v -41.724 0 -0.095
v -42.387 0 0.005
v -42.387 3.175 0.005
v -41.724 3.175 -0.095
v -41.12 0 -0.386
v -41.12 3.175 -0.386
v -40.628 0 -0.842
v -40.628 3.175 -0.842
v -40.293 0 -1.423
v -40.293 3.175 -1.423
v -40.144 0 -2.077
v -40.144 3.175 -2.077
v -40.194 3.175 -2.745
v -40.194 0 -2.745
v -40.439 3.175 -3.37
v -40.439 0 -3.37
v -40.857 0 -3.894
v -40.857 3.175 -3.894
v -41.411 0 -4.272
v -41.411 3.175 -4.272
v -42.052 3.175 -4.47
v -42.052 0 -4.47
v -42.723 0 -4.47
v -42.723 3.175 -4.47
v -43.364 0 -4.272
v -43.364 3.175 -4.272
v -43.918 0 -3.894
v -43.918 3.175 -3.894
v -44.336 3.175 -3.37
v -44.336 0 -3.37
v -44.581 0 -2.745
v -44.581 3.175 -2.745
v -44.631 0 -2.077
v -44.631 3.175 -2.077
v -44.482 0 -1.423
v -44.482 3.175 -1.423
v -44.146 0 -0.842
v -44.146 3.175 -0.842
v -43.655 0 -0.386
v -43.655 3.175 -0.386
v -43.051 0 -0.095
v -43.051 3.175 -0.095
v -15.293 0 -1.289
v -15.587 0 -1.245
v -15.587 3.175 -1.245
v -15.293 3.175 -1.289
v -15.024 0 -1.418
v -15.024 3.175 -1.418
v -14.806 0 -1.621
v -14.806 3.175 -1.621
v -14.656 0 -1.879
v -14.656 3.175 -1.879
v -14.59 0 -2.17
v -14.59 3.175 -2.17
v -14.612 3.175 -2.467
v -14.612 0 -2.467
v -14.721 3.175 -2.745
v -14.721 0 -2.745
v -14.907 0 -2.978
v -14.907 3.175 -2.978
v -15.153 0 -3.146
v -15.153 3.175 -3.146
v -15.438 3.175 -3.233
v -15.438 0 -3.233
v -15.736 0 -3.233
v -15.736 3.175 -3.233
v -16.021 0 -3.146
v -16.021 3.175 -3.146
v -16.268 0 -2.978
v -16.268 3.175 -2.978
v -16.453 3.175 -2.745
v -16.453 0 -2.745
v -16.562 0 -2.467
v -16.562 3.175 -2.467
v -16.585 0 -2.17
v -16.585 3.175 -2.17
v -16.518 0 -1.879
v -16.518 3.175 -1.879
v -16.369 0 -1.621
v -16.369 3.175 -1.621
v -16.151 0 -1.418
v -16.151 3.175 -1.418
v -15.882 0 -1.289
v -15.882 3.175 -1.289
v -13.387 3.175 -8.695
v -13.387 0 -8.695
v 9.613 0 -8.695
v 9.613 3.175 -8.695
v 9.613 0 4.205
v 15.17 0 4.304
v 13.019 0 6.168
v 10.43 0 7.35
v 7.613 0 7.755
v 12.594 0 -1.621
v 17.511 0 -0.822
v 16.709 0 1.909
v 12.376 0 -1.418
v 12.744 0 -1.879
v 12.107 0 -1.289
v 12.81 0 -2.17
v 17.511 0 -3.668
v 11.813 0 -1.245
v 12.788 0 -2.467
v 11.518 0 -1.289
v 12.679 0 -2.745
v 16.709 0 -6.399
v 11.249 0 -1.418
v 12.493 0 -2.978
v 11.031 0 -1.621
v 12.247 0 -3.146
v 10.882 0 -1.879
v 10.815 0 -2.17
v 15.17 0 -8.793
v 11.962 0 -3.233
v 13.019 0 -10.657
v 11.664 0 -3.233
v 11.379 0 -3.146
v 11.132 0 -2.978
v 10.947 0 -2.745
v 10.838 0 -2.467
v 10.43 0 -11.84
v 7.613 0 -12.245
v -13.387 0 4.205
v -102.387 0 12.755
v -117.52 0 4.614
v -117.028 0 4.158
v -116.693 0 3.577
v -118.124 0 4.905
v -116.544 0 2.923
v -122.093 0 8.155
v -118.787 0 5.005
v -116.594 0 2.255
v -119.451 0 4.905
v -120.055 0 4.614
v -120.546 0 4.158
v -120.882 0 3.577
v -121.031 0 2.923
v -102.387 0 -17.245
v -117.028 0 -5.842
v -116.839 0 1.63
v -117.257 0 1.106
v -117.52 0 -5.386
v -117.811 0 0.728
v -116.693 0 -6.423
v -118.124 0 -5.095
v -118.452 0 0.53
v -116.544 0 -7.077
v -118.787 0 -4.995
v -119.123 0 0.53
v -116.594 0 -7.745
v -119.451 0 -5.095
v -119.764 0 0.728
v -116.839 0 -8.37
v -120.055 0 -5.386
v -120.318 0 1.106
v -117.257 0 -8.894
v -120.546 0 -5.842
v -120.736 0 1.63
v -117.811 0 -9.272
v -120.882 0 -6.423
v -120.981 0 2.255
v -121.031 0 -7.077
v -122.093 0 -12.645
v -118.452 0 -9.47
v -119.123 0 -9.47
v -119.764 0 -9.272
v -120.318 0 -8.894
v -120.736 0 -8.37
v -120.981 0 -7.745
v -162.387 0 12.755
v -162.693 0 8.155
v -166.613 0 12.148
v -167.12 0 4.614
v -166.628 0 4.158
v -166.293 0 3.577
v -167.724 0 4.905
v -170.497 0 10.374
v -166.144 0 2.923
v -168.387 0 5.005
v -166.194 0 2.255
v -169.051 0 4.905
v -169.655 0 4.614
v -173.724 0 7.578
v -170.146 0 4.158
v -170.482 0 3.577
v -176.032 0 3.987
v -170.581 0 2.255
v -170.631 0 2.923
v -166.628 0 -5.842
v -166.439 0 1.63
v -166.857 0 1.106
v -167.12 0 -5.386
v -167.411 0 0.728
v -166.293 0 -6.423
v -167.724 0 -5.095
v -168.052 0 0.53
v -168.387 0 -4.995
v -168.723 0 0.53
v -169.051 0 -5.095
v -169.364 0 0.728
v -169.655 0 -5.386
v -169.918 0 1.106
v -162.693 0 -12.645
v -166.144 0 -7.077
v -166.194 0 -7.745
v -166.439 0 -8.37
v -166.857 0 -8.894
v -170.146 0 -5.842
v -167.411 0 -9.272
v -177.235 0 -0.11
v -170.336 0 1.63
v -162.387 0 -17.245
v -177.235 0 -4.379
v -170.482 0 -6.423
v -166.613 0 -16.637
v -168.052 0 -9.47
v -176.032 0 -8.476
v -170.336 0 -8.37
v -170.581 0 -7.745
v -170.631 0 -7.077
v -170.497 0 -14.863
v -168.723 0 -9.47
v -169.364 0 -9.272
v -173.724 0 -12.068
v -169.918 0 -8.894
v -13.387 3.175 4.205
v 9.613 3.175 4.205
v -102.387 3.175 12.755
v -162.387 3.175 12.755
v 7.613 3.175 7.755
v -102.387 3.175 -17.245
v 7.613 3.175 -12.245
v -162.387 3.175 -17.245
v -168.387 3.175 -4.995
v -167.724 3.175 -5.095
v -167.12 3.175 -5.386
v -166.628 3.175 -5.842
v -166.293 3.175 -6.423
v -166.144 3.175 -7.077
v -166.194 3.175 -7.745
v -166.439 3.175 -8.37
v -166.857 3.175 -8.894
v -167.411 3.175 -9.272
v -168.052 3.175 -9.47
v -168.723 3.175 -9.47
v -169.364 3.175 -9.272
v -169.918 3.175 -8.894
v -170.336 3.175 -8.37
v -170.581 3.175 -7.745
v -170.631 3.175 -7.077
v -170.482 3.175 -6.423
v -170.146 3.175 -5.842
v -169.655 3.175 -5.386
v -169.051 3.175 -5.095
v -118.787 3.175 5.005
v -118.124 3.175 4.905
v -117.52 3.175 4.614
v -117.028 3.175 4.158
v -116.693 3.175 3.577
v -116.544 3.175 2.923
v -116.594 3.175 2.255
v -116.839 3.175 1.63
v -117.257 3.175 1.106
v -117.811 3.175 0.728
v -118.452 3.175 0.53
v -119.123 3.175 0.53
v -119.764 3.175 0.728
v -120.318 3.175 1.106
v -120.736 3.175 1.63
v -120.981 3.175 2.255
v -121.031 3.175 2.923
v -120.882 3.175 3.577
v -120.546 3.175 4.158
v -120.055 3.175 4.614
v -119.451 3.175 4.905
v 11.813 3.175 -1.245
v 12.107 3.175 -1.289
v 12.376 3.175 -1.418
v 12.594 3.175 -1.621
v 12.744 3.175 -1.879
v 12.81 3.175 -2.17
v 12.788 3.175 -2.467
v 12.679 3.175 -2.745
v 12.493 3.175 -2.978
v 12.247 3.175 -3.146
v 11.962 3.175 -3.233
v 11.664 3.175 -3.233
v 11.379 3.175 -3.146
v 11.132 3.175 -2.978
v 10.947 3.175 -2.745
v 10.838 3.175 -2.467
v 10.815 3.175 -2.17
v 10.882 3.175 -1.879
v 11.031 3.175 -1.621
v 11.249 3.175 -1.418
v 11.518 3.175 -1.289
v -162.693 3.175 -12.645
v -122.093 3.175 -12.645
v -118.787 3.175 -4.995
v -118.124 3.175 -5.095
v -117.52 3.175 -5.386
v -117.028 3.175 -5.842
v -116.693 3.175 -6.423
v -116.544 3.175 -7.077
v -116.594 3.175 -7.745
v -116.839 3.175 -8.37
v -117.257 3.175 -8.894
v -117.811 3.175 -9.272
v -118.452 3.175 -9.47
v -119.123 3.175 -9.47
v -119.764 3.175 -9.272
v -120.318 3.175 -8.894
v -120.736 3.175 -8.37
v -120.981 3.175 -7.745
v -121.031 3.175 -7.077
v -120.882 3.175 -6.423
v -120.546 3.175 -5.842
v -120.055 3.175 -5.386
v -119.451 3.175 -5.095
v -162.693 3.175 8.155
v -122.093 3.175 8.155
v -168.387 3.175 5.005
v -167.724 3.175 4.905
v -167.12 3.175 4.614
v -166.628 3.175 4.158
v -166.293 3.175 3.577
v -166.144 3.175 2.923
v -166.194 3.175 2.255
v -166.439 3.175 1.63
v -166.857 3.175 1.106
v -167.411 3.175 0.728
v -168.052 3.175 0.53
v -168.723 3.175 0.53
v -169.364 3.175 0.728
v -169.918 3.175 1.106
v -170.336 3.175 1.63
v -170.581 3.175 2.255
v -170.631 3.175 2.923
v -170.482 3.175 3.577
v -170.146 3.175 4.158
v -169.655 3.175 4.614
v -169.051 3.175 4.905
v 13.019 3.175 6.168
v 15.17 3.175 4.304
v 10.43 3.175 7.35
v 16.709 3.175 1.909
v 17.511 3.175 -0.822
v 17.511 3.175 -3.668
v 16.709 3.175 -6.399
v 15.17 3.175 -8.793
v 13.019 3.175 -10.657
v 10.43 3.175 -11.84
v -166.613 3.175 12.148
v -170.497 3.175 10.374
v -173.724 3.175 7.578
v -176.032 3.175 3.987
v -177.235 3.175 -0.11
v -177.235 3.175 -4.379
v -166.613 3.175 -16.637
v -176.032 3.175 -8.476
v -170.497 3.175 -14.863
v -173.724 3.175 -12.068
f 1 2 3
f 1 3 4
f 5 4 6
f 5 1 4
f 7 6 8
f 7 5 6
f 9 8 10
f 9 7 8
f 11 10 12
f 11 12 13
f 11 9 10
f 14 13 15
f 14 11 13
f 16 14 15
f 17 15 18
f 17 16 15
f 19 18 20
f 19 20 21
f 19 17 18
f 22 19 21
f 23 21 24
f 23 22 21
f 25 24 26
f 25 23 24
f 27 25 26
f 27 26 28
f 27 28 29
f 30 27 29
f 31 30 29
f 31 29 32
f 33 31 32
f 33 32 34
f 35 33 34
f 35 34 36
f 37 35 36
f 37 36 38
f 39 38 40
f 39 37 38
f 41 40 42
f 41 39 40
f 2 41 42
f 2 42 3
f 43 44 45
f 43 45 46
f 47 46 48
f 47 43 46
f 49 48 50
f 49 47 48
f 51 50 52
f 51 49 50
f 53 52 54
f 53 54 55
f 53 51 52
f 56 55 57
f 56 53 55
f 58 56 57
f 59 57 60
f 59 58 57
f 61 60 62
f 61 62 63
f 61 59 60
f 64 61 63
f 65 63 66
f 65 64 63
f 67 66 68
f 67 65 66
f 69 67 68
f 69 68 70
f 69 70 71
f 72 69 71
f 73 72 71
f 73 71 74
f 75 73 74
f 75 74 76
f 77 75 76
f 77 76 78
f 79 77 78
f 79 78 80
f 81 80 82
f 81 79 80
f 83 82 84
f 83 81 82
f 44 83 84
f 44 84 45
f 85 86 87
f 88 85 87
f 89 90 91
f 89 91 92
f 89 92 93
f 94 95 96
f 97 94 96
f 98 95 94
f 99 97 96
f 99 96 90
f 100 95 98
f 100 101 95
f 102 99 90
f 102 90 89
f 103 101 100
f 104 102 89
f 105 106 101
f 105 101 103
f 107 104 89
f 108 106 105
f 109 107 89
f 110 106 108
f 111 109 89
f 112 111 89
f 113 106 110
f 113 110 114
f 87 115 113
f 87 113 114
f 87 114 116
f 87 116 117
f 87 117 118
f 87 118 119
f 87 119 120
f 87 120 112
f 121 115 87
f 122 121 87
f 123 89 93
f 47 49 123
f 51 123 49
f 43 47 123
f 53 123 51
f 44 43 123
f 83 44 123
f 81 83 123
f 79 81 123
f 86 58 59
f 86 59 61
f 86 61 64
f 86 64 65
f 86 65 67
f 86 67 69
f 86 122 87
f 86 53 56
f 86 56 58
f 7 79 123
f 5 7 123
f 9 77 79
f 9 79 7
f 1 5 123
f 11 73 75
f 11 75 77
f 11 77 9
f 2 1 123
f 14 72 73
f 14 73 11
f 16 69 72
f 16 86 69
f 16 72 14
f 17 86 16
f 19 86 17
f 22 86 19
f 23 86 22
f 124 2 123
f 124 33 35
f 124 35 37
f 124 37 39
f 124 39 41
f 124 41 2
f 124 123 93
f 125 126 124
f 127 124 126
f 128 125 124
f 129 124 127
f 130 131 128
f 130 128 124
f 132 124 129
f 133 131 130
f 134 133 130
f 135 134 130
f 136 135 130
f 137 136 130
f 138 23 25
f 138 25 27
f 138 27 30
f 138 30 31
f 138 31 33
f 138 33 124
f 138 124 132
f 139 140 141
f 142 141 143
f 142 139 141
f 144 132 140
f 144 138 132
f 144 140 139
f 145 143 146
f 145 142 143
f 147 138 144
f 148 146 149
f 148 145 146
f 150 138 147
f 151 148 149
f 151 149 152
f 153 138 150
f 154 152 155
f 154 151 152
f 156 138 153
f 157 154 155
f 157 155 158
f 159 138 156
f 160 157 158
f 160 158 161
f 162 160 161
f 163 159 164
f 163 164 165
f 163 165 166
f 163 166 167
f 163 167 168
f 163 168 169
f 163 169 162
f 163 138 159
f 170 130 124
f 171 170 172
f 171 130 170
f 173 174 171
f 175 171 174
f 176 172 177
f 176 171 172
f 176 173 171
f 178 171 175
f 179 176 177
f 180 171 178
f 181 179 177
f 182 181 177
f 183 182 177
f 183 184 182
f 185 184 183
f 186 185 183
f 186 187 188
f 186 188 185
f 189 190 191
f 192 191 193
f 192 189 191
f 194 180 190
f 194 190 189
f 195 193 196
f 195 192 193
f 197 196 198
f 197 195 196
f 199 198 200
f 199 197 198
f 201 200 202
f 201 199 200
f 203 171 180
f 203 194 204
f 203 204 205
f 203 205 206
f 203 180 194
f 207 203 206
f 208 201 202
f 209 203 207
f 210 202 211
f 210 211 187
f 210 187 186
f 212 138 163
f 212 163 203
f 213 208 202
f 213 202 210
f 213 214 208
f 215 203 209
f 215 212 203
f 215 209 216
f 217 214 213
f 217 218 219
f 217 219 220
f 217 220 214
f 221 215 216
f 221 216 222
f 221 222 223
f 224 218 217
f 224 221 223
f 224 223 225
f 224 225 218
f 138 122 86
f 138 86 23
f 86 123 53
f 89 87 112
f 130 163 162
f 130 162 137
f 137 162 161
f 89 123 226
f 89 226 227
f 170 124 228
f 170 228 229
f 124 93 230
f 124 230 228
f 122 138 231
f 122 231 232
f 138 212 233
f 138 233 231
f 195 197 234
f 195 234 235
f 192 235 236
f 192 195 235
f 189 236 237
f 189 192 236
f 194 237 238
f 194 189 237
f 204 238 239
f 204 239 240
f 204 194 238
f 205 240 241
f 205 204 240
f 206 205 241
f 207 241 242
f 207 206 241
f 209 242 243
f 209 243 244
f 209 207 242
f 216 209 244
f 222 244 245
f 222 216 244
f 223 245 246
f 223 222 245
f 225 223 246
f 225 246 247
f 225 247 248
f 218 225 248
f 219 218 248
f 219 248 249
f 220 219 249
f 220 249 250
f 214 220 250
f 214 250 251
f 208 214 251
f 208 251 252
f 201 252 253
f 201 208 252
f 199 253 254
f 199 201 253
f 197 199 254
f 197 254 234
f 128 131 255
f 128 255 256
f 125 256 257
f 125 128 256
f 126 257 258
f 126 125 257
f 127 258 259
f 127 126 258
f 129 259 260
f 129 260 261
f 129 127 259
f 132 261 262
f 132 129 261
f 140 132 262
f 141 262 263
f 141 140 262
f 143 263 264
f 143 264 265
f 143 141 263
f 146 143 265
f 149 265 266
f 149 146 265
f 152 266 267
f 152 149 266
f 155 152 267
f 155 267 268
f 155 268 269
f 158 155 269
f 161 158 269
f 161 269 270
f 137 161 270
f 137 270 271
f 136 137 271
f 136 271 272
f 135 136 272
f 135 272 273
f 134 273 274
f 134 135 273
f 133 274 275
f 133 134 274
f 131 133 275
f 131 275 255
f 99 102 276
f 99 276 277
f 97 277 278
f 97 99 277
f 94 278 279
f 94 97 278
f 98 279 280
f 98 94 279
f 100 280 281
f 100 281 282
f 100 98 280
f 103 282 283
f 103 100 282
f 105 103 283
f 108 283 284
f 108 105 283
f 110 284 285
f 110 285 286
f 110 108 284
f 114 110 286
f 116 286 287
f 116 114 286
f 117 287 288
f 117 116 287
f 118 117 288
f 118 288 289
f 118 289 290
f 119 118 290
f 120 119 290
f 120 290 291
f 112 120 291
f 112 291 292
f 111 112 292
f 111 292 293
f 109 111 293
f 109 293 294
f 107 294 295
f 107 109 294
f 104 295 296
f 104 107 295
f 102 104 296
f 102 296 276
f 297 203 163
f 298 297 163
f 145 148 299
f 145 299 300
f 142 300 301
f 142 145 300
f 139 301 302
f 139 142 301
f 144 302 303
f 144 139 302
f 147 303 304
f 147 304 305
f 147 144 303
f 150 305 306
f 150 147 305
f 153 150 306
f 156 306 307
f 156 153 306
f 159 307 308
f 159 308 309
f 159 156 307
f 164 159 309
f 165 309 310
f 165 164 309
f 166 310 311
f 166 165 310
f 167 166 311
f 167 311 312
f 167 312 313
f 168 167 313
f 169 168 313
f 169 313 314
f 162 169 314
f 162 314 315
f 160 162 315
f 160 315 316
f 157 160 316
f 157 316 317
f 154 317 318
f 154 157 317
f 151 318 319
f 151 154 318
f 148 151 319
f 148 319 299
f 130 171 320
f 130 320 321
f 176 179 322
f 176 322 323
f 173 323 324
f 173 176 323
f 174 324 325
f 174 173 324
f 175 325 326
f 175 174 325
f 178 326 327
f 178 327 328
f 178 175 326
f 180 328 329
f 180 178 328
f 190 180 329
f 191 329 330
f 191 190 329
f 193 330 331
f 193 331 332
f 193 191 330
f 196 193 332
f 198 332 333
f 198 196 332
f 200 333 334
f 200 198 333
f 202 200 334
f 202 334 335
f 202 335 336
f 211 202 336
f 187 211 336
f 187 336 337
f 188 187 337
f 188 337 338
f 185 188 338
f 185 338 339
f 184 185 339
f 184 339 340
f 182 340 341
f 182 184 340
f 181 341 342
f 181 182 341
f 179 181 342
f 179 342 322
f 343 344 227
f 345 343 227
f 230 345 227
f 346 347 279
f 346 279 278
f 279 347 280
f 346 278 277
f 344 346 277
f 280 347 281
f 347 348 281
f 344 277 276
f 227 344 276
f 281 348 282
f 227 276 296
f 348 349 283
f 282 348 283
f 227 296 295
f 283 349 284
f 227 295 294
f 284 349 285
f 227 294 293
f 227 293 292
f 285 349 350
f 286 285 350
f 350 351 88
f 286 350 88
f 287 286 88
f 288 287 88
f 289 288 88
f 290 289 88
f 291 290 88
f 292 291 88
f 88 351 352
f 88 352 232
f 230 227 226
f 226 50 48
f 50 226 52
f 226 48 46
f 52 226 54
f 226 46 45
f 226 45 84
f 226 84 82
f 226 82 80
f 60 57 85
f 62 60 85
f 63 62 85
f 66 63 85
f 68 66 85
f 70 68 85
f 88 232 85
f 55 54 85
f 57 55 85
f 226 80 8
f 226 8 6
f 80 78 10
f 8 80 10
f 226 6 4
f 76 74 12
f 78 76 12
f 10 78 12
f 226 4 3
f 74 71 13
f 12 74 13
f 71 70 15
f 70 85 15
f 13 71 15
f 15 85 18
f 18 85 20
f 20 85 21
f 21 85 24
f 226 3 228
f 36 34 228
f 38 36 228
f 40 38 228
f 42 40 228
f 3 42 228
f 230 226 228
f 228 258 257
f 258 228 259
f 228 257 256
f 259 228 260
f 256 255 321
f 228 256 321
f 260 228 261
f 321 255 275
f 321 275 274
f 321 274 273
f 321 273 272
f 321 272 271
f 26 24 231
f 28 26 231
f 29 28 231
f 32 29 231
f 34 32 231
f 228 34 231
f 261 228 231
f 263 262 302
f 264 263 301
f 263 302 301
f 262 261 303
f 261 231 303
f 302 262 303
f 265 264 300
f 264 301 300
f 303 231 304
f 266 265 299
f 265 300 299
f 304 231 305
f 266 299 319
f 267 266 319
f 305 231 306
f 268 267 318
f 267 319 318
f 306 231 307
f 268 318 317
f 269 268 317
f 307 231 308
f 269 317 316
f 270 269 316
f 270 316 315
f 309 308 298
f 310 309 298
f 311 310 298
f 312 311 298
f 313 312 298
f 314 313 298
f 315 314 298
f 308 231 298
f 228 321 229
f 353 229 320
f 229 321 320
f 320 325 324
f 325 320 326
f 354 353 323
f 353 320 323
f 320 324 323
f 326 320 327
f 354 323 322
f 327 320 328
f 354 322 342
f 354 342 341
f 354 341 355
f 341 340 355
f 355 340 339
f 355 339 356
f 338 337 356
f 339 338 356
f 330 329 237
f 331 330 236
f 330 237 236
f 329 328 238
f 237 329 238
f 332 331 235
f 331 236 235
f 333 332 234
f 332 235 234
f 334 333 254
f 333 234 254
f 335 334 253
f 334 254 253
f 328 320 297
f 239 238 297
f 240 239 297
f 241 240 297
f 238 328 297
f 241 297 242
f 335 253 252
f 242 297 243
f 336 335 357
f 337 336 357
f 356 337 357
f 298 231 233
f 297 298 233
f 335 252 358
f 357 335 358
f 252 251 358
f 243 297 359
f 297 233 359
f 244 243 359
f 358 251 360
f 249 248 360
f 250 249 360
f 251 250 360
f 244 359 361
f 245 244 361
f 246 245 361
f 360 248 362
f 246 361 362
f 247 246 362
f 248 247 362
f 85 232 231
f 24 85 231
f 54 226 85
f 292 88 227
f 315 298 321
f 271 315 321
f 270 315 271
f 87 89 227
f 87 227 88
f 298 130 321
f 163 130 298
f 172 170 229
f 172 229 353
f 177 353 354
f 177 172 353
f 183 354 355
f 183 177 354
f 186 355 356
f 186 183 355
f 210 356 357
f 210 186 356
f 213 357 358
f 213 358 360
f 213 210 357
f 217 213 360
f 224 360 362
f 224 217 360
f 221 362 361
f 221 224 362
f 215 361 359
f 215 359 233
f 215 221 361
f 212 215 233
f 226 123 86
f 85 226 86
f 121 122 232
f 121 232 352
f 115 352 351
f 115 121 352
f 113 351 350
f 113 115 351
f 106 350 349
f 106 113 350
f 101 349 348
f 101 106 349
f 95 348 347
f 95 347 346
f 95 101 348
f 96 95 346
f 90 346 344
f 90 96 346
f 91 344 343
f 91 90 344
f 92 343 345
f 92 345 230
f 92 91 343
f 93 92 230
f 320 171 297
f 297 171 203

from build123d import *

# Parameters (mm, degrees)
SKETCH1_R           = 2.25
SKETCH1_R_2         = 1
SKETCH1_W           = 40.6
SKETCH1_H           = 20.8
SKETCH1_W_2         = 23
SKETCH1_H_2         = 12.9
BOSS_EXTRUDE1_DEPTH = 3.175


with BuildPart() as part:
    # Sketch1 → Boss-Extrude1 (new body)
    with BuildSketch(Plane(origin=(0, 0, 0), x_dir=(1, 0, 0), z_dir=(0, 1, 0))):
        with BuildLine():
            Line((-162.38735588, 17.244652891), (-102.38735588, 17.244652891))
            Line((-102.38735588, 17.244652891), (7.61264412, 12.244652891))
            ThreePointArc((7.61264412, 12.244652891), (17.61264412, 2.244652891), (7.61264412, -7.755347109))
            Line((7.61264412, -7.755347109), (-102.38735588, -12.755347109))
            Line((-102.38735588, -12.755347109), (-162.38735588, -12.755347109))
            ThreePointArc((-162.38735588, -12.755347109), (-177.38735588, 2.244652891), (-162.38735588, 17.244652891))
        make_face()
        with Locations(Location((-168.38735588, 7.244652891, 0), (0, 0, 270))):
            Circle(SKETCH1_R, mode=Mode.SUBTRACT)
        with Locations(Location((-168.38735588, -2.755347109, 0), (0, 0, 270))):
            Circle(SKETCH1_R, mode=Mode.SUBTRACT)
        with Locations(Location((-118.78735588, 7.244652891, 0), (0, 0, 270))):
            Circle(SKETCH1_R, mode=Mode.SUBTRACT)
        with Locations(Location((-118.78735588, -2.755347109, 0), (0, 0, 270))):
            Circle(SKETCH1_R, mode=Mode.SUBTRACT)
        with Locations(Location((-15.58735588, 2.244652891, 0), (0, 0, 270))):
            Circle(SKETCH1_R_2, mode=Mode.SUBTRACT)
        with Locations(Location((11.81264412, 2.244652891, 0), (0, 0, 270))):
            Circle(SKETCH1_R_2, mode=Mode.SUBTRACT)
        with Locations(Location((-42.38735588, 2.244652891, 0), (0, 0, 270))):
            Circle(SKETCH1_R, mode=Mode.SUBTRACT)
        with Locations((-142.392621679, 2.244652891)):
            Rectangle(SKETCH1_W, SKETCH1_H, mode=Mode.SUBTRACT)
        with Locations((-1.88735588, 2.244652891)):
            Rectangle(SKETCH1_W_2, SKETCH1_H_2, mode=Mode.SUBTRACT)
    extrude(amount=BOSS_EXTRUDE1_DEPTH)


solid = part.part
